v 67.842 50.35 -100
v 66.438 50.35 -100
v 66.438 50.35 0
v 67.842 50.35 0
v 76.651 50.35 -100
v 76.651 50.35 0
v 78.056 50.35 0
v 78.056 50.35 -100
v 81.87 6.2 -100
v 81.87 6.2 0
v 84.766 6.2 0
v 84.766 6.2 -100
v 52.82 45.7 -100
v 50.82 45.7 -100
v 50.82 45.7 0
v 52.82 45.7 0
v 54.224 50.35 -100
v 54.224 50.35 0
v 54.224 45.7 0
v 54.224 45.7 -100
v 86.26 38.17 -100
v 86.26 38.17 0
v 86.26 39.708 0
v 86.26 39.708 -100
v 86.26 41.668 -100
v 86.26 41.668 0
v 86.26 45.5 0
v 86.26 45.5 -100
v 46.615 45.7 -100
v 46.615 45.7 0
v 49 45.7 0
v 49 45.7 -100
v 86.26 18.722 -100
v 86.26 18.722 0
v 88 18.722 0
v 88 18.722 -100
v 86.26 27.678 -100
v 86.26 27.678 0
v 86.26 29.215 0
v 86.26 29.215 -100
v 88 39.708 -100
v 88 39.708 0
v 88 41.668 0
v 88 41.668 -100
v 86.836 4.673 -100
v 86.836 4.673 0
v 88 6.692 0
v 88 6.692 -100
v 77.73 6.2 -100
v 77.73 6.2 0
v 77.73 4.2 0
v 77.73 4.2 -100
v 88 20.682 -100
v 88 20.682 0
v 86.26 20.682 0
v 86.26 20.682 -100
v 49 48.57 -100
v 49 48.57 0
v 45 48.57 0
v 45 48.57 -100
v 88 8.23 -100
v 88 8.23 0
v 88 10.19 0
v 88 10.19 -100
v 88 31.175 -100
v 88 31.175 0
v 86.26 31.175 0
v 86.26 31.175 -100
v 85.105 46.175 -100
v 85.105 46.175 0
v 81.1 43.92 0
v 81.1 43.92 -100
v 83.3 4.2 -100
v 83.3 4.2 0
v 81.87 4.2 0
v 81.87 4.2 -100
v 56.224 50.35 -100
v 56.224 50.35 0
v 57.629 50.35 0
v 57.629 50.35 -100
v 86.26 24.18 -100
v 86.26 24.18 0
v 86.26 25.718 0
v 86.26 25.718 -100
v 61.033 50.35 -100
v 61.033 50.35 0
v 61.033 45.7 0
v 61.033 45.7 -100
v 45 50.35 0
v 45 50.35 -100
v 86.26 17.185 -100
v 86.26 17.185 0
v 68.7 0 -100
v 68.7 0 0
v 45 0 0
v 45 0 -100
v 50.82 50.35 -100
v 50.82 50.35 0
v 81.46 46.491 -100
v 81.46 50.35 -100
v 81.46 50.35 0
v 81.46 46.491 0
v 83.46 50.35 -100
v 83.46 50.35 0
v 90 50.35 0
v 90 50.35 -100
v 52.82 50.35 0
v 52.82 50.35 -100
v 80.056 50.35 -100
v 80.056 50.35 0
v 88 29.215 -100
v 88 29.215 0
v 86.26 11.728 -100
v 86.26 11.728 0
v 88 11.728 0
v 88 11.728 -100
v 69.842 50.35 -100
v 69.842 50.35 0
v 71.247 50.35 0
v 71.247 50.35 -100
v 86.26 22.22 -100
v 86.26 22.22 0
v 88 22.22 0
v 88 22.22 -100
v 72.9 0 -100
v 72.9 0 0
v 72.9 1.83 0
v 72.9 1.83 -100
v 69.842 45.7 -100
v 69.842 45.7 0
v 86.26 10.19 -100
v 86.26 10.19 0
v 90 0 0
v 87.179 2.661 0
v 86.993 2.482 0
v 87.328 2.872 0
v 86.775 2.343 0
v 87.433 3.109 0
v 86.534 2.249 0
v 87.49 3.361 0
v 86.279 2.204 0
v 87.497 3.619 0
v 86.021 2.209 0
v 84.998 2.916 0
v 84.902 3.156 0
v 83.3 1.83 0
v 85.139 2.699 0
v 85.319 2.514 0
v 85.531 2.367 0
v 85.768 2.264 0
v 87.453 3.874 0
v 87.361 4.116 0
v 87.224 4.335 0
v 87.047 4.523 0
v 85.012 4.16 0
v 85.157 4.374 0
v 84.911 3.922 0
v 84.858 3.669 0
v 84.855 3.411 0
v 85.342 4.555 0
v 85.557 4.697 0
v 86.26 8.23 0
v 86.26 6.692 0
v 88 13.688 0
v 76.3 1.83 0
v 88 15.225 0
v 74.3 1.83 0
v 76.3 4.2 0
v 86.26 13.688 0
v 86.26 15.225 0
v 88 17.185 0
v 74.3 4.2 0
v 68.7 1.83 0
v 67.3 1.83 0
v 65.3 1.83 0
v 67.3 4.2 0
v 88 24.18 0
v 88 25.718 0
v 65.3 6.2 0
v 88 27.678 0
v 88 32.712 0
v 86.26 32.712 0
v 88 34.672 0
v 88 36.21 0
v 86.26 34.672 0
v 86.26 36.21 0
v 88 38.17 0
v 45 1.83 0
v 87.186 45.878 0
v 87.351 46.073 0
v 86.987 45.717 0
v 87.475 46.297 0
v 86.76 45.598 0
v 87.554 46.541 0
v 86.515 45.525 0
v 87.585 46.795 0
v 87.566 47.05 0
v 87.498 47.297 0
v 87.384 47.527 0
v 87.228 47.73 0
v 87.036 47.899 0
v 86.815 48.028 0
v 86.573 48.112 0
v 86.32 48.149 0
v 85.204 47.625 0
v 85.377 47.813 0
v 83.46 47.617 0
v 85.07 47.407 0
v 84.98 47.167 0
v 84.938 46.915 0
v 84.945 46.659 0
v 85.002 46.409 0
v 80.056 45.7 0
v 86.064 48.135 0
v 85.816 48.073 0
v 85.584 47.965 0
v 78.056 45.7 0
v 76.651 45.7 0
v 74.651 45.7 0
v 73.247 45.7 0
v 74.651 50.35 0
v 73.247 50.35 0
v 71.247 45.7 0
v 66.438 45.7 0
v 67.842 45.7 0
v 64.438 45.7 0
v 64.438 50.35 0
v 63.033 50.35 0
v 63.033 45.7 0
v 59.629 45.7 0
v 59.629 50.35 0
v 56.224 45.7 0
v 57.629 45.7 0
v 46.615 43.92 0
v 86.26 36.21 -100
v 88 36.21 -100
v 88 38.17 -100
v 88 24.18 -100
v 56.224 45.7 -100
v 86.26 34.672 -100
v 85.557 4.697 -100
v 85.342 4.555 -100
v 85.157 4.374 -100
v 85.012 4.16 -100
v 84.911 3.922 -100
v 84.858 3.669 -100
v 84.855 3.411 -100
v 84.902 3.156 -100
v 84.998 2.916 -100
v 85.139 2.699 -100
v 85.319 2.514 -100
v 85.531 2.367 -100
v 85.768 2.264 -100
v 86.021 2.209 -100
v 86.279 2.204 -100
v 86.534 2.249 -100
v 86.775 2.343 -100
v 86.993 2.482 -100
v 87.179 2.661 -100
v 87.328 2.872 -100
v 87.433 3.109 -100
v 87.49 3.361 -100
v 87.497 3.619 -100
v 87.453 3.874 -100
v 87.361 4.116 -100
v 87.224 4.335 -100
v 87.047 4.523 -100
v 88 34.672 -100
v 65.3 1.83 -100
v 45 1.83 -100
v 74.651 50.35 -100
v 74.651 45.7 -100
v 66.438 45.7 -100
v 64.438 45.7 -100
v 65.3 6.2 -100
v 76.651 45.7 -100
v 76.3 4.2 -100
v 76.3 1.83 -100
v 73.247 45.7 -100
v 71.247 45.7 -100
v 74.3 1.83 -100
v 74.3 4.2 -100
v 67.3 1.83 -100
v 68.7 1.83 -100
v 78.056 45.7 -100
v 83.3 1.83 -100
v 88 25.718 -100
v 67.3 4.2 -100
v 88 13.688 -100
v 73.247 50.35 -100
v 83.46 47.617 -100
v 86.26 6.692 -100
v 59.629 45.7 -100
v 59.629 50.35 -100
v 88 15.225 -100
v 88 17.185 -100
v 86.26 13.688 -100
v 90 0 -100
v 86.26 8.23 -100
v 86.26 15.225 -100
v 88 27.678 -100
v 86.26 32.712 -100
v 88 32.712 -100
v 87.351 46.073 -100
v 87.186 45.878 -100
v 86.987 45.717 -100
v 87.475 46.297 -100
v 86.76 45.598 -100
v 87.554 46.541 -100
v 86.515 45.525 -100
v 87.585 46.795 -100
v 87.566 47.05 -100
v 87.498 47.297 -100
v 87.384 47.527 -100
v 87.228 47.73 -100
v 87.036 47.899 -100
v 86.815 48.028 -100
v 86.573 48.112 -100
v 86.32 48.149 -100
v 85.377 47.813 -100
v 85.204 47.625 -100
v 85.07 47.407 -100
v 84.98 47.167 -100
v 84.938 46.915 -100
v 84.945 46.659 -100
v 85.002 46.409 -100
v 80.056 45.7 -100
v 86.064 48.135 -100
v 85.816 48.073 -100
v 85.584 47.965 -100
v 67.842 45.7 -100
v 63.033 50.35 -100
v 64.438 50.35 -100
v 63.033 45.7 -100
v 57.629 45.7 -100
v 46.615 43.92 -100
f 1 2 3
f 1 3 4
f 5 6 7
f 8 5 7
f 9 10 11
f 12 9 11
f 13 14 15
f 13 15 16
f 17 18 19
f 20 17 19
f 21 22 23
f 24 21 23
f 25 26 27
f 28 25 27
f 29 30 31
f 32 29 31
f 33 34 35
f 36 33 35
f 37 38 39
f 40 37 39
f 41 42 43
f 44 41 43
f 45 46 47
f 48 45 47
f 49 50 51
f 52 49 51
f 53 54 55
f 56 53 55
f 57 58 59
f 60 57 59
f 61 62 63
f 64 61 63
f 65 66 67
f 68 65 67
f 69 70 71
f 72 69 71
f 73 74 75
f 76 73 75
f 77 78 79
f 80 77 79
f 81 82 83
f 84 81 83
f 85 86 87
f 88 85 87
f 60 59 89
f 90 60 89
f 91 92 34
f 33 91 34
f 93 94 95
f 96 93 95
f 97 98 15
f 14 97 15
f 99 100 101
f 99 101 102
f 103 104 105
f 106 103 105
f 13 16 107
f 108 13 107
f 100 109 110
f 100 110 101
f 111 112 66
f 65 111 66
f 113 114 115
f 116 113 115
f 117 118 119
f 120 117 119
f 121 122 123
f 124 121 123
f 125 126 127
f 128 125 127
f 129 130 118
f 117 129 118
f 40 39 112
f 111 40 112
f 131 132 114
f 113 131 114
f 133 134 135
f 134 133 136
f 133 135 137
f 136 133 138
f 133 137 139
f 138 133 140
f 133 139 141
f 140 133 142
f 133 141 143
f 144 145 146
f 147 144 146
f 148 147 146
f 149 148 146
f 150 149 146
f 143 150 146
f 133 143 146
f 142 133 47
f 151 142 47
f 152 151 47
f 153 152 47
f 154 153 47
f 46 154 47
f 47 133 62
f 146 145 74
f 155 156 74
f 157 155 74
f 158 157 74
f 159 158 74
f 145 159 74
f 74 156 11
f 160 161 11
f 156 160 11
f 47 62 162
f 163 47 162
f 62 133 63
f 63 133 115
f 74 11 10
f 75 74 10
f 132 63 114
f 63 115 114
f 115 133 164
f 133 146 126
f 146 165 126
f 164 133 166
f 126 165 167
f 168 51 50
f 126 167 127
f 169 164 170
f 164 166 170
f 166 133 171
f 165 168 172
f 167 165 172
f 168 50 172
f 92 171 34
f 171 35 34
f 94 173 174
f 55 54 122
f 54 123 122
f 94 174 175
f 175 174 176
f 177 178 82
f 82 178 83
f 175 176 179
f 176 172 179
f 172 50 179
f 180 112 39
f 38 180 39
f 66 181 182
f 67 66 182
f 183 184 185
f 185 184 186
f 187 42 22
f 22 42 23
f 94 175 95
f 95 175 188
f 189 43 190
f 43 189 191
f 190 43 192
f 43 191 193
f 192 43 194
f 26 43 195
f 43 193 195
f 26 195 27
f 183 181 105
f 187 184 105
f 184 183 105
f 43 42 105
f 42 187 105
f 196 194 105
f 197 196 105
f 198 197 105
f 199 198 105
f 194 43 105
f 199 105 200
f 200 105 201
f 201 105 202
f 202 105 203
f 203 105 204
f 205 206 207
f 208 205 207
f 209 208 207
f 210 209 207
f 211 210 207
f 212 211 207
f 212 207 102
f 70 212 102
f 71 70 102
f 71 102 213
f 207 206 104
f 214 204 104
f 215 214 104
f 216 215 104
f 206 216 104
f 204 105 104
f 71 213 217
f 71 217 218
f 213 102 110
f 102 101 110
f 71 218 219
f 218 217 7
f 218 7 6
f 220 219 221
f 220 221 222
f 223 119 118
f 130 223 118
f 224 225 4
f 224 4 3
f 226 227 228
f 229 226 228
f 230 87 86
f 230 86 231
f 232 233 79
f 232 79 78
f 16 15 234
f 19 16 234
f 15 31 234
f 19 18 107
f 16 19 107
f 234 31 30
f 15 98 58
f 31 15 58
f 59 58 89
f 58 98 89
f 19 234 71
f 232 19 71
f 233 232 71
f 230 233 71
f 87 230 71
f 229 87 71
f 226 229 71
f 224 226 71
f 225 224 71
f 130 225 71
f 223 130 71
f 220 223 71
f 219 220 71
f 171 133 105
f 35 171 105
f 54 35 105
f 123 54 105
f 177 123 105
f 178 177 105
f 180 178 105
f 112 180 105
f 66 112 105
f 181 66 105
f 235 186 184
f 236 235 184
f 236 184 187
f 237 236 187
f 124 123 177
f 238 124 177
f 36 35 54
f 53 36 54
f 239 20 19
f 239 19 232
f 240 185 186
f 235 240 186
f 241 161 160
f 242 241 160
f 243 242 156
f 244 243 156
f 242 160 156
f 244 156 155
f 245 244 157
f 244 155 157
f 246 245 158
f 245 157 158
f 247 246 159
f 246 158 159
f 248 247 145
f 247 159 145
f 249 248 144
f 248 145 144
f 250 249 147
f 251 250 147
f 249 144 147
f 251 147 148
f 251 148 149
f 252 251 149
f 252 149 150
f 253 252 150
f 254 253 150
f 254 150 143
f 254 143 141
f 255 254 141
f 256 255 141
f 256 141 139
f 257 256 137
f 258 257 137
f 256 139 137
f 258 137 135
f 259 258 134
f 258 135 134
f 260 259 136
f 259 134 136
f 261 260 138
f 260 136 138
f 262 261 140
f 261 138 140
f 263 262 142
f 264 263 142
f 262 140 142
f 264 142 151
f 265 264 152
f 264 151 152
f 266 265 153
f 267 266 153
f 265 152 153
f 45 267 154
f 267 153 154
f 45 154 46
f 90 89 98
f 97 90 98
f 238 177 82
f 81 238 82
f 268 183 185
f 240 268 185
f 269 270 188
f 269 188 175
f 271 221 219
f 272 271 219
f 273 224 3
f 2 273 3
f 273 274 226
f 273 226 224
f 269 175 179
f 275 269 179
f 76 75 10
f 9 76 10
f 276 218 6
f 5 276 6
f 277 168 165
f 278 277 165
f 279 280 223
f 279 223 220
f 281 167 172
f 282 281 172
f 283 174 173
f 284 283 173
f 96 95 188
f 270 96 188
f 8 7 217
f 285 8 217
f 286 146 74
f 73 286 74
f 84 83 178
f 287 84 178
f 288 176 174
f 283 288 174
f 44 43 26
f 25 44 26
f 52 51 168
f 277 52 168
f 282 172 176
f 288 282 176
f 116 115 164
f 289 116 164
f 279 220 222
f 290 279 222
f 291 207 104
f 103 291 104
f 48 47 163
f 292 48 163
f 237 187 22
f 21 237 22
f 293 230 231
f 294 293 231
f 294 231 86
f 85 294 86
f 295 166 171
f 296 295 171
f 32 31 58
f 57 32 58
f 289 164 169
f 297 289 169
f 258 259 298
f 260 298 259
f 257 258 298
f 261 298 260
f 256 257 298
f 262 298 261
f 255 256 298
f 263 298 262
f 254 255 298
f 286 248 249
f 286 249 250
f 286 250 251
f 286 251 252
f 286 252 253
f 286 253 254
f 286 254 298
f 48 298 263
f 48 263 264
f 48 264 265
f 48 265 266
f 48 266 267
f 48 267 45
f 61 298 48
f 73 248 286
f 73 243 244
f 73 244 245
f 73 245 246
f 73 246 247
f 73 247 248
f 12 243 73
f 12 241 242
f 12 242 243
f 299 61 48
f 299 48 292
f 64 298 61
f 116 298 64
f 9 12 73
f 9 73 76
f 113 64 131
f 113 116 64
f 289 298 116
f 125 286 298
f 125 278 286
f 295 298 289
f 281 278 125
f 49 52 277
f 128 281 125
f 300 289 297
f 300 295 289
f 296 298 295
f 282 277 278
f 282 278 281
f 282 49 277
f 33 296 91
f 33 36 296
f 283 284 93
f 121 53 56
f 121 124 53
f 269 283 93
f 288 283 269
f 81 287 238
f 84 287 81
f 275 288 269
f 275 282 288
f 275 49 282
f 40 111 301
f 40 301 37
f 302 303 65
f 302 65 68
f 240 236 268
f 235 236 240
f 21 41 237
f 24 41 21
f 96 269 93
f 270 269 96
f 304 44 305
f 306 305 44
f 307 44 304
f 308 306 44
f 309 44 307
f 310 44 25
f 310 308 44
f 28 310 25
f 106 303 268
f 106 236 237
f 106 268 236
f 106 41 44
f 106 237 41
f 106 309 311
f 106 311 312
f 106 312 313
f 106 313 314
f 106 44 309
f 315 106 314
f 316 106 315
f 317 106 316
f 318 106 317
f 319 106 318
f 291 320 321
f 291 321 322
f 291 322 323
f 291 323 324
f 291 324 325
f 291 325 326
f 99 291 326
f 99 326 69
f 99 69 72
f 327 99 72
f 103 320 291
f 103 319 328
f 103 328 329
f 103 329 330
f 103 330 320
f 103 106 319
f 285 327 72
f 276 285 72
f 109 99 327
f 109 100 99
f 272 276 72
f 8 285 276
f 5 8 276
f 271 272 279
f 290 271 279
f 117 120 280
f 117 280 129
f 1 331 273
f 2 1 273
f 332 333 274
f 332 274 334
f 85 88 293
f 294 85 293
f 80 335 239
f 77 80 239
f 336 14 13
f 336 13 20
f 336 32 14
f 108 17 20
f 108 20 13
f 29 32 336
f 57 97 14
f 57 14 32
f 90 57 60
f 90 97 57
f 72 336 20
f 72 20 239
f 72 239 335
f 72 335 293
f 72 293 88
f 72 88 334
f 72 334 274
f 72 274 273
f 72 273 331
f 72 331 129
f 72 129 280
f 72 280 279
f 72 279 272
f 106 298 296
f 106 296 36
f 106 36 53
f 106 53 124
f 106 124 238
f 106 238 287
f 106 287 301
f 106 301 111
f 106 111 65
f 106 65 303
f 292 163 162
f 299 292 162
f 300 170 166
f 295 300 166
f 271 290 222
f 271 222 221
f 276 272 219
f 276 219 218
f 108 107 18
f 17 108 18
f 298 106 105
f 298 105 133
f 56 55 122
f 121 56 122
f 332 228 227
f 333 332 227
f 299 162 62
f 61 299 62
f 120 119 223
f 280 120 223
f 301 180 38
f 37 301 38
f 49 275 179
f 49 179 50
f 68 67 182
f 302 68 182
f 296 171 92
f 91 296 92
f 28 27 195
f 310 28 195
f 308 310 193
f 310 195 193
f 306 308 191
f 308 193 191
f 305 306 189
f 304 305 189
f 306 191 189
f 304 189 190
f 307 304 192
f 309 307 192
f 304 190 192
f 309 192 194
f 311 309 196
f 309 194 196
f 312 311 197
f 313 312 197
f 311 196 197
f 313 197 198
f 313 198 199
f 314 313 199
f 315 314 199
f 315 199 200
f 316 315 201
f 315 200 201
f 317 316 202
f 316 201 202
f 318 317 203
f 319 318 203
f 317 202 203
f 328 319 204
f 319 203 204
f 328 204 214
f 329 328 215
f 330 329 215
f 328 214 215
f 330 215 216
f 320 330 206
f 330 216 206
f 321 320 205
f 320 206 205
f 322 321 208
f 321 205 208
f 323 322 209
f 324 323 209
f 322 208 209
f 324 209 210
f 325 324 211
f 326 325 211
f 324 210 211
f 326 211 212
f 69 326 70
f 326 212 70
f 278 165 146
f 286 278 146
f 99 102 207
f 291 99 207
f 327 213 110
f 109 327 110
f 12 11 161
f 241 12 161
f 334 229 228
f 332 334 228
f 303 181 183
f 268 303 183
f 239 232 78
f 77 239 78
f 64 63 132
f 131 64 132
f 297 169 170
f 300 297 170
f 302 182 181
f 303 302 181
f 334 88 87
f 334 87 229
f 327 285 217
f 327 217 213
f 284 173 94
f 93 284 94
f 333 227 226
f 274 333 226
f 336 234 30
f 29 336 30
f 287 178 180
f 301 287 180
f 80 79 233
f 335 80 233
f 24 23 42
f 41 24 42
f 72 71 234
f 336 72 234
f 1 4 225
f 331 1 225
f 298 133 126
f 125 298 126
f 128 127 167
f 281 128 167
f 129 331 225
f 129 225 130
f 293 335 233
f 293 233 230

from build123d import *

# Parameters (mm, degrees)
BOSS_EXTRUDE1_DEPTH = 100


with BuildPart() as part:
    # Sketch2 → Boss-Extrude1 (new body)
    with BuildSketch(Plane(origin=(0, 0, 0), x_dir=(-1, 0, 0), z_dir=(0, 0, -1))):
        with BuildLine():
            Line((-81.1, 43.92), (-46.615, 43.92))
            Line((-46.615, 43.92), (-46.615, 45.7))
            Line((-46.615, 45.7), (-49, 45.7))
            Line((-49, 45.7), (-49, 48.57))
            Line((-49, 48.57), (-45, 48.57))
            Line((-45, 48.57), (-45, 50.35))
            Line((-45, 50.35), (-50.82, 50.35))
            Line((-50.82, 50.35), (-50.82, 45.7))
            Line((-50.82, 45.7), (-52.82, 45.7))
            Line((-52.82, 45.7), (-52.82, 50.35))
            Line((-52.82, 50.35), (-54.224444444, 50.35))
            Line((-54.224444444, 50.35), (-54.224444444, 45.7))
            Line((-54.224444444, 45.7), (-56.224444444, 45.7))
            Line((-56.224444444, 45.7), (-56.224444444, 50.35))
            Line((-56.224444444, 50.35), (-57.628888889, 50.35))
            Line((-57.628888889, 50.35), (-57.628888889, 45.7))
            Line((-57.628888889, 45.7), (-59.628888889, 45.7))
            Line((-59.628888889, 45.7), (-59.628888889, 50.35))
            Line((-59.628888889, 50.35), (-61.033333333, 50.35))
            Line((-61.033333333, 50.35), (-61.033333333, 45.7))
            Line((-61.033333333, 45.7), (-63.033333333, 45.7))
            Line((-63.033333333, 45.7), (-63.033333333, 50.35))
            Line((-63.033333333, 50.35), (-64.437777778, 50.35))
            Line((-64.437777778, 50.35), (-64.437777778, 45.7))
            Line((-64.437777778, 45.7), (-66.437777778, 45.7))
            Line((-66.437777778, 45.7), (-66.437777778, 50.35))
            Line((-66.437777778, 50.35), (-67.842222222, 50.35))
            Line((-67.842222222, 50.35), (-67.842222222, 45.7))
            Line((-67.842222222, 45.7), (-69.842222222, 45.7))
            Line((-69.842222222, 45.7), (-69.842222222, 50.35))
            Line((-69.842222222, 50.35), (-71.246666667, 50.35))
            Line((-71.246666667, 50.35), (-71.246666667, 45.7))
            Line((-71.246666667, 45.7), (-73.246666667, 45.7))
            Line((-73.246666667, 45.7), (-73.246666667, 50.35))
            Line((-73.246666667, 50.35), (-74.651111111, 50.35))
            Line((-74.651111111, 50.35), (-74.651111111, 45.7))
            Line((-74.651111111, 45.7), (-76.651111111, 45.7))
            Line((-76.651111111, 45.7), (-76.651111111, 50.35))
            Line((-76.651111111, 50.35), (-78.055555556, 50.35))
            Line((-78.055555556, 50.35), (-78.055555556, 45.7))
            Line((-78.055555556, 45.7), (-80.055555556, 45.7))
            Line((-80.055555556, 45.7), (-80.055555556, 50.35))
            Line((-80.055555556, 50.35), (-81.46, 50.35))
            Line((-81.46, 50.35), (-81.46, 46.490680448))
            Line((-81.46, 46.490680448), (-83.46, 47.61664944))
            Line((-83.46, 47.61664944), (-83.46, 50.35))
            Line((-83.46, 50.35), (-90, 50.35))
            Line((-90, 50.35), (-90, 0))
            Line((-90, 0), (-72.9, 0))
            Line((-72.9, 0), (-72.9, 1.83))
            Line((-72.9, 1.83), (-74.3, 1.83))
            Line((-74.3, 1.83), (-74.3, 4.2))
            Line((-74.3, 4.2), (-67.3, 4.2))
            Line((-67.3, 4.2), (-67.3, 1.83))
            Line((-67.3, 1.83), (-68.7, 1.83))
            Line((-68.7, 1.83), (-68.7, 0))
            Line((-68.7, 0), (-45, 0))
            Line((-45, 0), (-45, 1.83))
            Line((-45, 1.83), (-65.3, 1.83))
            Line((-65.3, 1.83), (-65.3, 6.2))
            Line((-65.3, 6.2), (-77.73, 6.2))
            Line((-77.73, 6.2), (-77.73, 4.2))
            Line((-77.73, 4.2), (-76.3, 4.2))
            Line((-76.3, 4.2), (-76.3, 1.83))
            Line((-76.3, 1.83), (-83.3, 1.83))
            Line((-83.3, 1.83), (-83.3, 4.2))
            Line((-83.3, 4.2), (-81.87, 4.2))
            Line((-81.87, 4.2), (-81.87, 6.2))
            Line((-81.87, 6.2), (-84.76556902, 6.2))
            Line((-84.76556902, 6.2), (-85.557358859, 4.697239063))
            ThreePointArc((-85.557358859, 4.697239063), (-86.149971444, 2.200236409), (-86.836478439, 4.673072852))
            Line((-86.836478439, 4.673072852), (-88, 6.6925))
            Line((-88, 6.6925), (-86.26, 6.6925))
            Line((-86.26, 6.6925), (-86.26, 8.23))
            Line((-86.26, 8.23), (-88, 8.23))
            Line((-88, 8.23), (-88, 10.19))
            Line((-88, 10.19), (-86.26, 10.19))
            Line((-86.26, 10.19), (-86.26, 11.7275))
            Line((-86.26, 11.7275), (-88, 11.7275))
            Line((-88, 11.7275), (-88, 13.6875))
            Line((-88, 13.6875), (-86.26, 13.6875))
            Line((-86.26, 13.6875), (-86.26, 15.225))
            Line((-86.26, 15.225), (-88, 15.225))
            Line((-88, 15.225), (-88, 17.185))
            Line((-88, 17.185), (-86.26, 17.185))
            Line((-86.26, 17.185), (-86.26, 18.7225))
            Line((-86.26, 18.7225), (-88, 18.7225))
            Line((-88, 18.7225), (-88, 20.6825))
            Line((-88, 20.6825), (-86.26, 20.6825))
            Line((-86.26, 20.6825), (-86.26, 22.22))
            Line((-86.26, 22.22), (-88, 22.22))
            Line((-88, 22.22), (-88, 24.18))
            Line((-88, 24.18), (-86.26, 24.18))
            Line((-86.26, 24.18), (-86.26, 25.7175))
            Line((-86.26, 25.7175), (-88, 25.7175))
            Line((-88, 25.7175), (-88, 27.6775))
            Line((-88, 27.6775), (-86.26, 27.6775))
            Line((-86.26, 27.6775), (-86.26, 29.215))
            Line((-86.26, 29.215), (-88, 29.215))
            Line((-88, 29.215), (-88, 31.175))
            Line((-88, 31.175), (-86.26, 31.175))
            Line((-86.26, 31.175), (-86.26, 32.7125))
            Line((-86.26, 32.7125), (-88, 32.7125))
            Line((-88, 32.7125), (-88, 34.6725))
            Line((-88, 34.6725), (-86.26, 34.6725))
            Line((-86.26, 34.6725), (-86.26, 36.21))
            Line((-86.26, 36.21), (-88, 36.21))
            Line((-88, 36.21), (-88, 38.17))
            Line((-88, 38.17), (-86.26, 38.17))
            Line((-86.26, 38.17), (-86.26, 39.7075))
            Line((-86.26, 39.7075), (-88, 39.7075))
            Line((-88, 39.7075), (-88, 41.6675))
            Line((-88, 41.6675), (-86.26, 41.6675))
            Line((-86.26, 41.6675), (-86.26, 45.5))
            ThreePointArc((-86.26, 45.5), (-86.92871037, 47.968875623), (-85.105401522, 46.174978958))
            Line((-85.105401522, 46.174978958), (-81.1, 43.92))
        make_face()
    extrude(amount=BOSS_EXTRUDE1_DEPTH)


solid = part.part
